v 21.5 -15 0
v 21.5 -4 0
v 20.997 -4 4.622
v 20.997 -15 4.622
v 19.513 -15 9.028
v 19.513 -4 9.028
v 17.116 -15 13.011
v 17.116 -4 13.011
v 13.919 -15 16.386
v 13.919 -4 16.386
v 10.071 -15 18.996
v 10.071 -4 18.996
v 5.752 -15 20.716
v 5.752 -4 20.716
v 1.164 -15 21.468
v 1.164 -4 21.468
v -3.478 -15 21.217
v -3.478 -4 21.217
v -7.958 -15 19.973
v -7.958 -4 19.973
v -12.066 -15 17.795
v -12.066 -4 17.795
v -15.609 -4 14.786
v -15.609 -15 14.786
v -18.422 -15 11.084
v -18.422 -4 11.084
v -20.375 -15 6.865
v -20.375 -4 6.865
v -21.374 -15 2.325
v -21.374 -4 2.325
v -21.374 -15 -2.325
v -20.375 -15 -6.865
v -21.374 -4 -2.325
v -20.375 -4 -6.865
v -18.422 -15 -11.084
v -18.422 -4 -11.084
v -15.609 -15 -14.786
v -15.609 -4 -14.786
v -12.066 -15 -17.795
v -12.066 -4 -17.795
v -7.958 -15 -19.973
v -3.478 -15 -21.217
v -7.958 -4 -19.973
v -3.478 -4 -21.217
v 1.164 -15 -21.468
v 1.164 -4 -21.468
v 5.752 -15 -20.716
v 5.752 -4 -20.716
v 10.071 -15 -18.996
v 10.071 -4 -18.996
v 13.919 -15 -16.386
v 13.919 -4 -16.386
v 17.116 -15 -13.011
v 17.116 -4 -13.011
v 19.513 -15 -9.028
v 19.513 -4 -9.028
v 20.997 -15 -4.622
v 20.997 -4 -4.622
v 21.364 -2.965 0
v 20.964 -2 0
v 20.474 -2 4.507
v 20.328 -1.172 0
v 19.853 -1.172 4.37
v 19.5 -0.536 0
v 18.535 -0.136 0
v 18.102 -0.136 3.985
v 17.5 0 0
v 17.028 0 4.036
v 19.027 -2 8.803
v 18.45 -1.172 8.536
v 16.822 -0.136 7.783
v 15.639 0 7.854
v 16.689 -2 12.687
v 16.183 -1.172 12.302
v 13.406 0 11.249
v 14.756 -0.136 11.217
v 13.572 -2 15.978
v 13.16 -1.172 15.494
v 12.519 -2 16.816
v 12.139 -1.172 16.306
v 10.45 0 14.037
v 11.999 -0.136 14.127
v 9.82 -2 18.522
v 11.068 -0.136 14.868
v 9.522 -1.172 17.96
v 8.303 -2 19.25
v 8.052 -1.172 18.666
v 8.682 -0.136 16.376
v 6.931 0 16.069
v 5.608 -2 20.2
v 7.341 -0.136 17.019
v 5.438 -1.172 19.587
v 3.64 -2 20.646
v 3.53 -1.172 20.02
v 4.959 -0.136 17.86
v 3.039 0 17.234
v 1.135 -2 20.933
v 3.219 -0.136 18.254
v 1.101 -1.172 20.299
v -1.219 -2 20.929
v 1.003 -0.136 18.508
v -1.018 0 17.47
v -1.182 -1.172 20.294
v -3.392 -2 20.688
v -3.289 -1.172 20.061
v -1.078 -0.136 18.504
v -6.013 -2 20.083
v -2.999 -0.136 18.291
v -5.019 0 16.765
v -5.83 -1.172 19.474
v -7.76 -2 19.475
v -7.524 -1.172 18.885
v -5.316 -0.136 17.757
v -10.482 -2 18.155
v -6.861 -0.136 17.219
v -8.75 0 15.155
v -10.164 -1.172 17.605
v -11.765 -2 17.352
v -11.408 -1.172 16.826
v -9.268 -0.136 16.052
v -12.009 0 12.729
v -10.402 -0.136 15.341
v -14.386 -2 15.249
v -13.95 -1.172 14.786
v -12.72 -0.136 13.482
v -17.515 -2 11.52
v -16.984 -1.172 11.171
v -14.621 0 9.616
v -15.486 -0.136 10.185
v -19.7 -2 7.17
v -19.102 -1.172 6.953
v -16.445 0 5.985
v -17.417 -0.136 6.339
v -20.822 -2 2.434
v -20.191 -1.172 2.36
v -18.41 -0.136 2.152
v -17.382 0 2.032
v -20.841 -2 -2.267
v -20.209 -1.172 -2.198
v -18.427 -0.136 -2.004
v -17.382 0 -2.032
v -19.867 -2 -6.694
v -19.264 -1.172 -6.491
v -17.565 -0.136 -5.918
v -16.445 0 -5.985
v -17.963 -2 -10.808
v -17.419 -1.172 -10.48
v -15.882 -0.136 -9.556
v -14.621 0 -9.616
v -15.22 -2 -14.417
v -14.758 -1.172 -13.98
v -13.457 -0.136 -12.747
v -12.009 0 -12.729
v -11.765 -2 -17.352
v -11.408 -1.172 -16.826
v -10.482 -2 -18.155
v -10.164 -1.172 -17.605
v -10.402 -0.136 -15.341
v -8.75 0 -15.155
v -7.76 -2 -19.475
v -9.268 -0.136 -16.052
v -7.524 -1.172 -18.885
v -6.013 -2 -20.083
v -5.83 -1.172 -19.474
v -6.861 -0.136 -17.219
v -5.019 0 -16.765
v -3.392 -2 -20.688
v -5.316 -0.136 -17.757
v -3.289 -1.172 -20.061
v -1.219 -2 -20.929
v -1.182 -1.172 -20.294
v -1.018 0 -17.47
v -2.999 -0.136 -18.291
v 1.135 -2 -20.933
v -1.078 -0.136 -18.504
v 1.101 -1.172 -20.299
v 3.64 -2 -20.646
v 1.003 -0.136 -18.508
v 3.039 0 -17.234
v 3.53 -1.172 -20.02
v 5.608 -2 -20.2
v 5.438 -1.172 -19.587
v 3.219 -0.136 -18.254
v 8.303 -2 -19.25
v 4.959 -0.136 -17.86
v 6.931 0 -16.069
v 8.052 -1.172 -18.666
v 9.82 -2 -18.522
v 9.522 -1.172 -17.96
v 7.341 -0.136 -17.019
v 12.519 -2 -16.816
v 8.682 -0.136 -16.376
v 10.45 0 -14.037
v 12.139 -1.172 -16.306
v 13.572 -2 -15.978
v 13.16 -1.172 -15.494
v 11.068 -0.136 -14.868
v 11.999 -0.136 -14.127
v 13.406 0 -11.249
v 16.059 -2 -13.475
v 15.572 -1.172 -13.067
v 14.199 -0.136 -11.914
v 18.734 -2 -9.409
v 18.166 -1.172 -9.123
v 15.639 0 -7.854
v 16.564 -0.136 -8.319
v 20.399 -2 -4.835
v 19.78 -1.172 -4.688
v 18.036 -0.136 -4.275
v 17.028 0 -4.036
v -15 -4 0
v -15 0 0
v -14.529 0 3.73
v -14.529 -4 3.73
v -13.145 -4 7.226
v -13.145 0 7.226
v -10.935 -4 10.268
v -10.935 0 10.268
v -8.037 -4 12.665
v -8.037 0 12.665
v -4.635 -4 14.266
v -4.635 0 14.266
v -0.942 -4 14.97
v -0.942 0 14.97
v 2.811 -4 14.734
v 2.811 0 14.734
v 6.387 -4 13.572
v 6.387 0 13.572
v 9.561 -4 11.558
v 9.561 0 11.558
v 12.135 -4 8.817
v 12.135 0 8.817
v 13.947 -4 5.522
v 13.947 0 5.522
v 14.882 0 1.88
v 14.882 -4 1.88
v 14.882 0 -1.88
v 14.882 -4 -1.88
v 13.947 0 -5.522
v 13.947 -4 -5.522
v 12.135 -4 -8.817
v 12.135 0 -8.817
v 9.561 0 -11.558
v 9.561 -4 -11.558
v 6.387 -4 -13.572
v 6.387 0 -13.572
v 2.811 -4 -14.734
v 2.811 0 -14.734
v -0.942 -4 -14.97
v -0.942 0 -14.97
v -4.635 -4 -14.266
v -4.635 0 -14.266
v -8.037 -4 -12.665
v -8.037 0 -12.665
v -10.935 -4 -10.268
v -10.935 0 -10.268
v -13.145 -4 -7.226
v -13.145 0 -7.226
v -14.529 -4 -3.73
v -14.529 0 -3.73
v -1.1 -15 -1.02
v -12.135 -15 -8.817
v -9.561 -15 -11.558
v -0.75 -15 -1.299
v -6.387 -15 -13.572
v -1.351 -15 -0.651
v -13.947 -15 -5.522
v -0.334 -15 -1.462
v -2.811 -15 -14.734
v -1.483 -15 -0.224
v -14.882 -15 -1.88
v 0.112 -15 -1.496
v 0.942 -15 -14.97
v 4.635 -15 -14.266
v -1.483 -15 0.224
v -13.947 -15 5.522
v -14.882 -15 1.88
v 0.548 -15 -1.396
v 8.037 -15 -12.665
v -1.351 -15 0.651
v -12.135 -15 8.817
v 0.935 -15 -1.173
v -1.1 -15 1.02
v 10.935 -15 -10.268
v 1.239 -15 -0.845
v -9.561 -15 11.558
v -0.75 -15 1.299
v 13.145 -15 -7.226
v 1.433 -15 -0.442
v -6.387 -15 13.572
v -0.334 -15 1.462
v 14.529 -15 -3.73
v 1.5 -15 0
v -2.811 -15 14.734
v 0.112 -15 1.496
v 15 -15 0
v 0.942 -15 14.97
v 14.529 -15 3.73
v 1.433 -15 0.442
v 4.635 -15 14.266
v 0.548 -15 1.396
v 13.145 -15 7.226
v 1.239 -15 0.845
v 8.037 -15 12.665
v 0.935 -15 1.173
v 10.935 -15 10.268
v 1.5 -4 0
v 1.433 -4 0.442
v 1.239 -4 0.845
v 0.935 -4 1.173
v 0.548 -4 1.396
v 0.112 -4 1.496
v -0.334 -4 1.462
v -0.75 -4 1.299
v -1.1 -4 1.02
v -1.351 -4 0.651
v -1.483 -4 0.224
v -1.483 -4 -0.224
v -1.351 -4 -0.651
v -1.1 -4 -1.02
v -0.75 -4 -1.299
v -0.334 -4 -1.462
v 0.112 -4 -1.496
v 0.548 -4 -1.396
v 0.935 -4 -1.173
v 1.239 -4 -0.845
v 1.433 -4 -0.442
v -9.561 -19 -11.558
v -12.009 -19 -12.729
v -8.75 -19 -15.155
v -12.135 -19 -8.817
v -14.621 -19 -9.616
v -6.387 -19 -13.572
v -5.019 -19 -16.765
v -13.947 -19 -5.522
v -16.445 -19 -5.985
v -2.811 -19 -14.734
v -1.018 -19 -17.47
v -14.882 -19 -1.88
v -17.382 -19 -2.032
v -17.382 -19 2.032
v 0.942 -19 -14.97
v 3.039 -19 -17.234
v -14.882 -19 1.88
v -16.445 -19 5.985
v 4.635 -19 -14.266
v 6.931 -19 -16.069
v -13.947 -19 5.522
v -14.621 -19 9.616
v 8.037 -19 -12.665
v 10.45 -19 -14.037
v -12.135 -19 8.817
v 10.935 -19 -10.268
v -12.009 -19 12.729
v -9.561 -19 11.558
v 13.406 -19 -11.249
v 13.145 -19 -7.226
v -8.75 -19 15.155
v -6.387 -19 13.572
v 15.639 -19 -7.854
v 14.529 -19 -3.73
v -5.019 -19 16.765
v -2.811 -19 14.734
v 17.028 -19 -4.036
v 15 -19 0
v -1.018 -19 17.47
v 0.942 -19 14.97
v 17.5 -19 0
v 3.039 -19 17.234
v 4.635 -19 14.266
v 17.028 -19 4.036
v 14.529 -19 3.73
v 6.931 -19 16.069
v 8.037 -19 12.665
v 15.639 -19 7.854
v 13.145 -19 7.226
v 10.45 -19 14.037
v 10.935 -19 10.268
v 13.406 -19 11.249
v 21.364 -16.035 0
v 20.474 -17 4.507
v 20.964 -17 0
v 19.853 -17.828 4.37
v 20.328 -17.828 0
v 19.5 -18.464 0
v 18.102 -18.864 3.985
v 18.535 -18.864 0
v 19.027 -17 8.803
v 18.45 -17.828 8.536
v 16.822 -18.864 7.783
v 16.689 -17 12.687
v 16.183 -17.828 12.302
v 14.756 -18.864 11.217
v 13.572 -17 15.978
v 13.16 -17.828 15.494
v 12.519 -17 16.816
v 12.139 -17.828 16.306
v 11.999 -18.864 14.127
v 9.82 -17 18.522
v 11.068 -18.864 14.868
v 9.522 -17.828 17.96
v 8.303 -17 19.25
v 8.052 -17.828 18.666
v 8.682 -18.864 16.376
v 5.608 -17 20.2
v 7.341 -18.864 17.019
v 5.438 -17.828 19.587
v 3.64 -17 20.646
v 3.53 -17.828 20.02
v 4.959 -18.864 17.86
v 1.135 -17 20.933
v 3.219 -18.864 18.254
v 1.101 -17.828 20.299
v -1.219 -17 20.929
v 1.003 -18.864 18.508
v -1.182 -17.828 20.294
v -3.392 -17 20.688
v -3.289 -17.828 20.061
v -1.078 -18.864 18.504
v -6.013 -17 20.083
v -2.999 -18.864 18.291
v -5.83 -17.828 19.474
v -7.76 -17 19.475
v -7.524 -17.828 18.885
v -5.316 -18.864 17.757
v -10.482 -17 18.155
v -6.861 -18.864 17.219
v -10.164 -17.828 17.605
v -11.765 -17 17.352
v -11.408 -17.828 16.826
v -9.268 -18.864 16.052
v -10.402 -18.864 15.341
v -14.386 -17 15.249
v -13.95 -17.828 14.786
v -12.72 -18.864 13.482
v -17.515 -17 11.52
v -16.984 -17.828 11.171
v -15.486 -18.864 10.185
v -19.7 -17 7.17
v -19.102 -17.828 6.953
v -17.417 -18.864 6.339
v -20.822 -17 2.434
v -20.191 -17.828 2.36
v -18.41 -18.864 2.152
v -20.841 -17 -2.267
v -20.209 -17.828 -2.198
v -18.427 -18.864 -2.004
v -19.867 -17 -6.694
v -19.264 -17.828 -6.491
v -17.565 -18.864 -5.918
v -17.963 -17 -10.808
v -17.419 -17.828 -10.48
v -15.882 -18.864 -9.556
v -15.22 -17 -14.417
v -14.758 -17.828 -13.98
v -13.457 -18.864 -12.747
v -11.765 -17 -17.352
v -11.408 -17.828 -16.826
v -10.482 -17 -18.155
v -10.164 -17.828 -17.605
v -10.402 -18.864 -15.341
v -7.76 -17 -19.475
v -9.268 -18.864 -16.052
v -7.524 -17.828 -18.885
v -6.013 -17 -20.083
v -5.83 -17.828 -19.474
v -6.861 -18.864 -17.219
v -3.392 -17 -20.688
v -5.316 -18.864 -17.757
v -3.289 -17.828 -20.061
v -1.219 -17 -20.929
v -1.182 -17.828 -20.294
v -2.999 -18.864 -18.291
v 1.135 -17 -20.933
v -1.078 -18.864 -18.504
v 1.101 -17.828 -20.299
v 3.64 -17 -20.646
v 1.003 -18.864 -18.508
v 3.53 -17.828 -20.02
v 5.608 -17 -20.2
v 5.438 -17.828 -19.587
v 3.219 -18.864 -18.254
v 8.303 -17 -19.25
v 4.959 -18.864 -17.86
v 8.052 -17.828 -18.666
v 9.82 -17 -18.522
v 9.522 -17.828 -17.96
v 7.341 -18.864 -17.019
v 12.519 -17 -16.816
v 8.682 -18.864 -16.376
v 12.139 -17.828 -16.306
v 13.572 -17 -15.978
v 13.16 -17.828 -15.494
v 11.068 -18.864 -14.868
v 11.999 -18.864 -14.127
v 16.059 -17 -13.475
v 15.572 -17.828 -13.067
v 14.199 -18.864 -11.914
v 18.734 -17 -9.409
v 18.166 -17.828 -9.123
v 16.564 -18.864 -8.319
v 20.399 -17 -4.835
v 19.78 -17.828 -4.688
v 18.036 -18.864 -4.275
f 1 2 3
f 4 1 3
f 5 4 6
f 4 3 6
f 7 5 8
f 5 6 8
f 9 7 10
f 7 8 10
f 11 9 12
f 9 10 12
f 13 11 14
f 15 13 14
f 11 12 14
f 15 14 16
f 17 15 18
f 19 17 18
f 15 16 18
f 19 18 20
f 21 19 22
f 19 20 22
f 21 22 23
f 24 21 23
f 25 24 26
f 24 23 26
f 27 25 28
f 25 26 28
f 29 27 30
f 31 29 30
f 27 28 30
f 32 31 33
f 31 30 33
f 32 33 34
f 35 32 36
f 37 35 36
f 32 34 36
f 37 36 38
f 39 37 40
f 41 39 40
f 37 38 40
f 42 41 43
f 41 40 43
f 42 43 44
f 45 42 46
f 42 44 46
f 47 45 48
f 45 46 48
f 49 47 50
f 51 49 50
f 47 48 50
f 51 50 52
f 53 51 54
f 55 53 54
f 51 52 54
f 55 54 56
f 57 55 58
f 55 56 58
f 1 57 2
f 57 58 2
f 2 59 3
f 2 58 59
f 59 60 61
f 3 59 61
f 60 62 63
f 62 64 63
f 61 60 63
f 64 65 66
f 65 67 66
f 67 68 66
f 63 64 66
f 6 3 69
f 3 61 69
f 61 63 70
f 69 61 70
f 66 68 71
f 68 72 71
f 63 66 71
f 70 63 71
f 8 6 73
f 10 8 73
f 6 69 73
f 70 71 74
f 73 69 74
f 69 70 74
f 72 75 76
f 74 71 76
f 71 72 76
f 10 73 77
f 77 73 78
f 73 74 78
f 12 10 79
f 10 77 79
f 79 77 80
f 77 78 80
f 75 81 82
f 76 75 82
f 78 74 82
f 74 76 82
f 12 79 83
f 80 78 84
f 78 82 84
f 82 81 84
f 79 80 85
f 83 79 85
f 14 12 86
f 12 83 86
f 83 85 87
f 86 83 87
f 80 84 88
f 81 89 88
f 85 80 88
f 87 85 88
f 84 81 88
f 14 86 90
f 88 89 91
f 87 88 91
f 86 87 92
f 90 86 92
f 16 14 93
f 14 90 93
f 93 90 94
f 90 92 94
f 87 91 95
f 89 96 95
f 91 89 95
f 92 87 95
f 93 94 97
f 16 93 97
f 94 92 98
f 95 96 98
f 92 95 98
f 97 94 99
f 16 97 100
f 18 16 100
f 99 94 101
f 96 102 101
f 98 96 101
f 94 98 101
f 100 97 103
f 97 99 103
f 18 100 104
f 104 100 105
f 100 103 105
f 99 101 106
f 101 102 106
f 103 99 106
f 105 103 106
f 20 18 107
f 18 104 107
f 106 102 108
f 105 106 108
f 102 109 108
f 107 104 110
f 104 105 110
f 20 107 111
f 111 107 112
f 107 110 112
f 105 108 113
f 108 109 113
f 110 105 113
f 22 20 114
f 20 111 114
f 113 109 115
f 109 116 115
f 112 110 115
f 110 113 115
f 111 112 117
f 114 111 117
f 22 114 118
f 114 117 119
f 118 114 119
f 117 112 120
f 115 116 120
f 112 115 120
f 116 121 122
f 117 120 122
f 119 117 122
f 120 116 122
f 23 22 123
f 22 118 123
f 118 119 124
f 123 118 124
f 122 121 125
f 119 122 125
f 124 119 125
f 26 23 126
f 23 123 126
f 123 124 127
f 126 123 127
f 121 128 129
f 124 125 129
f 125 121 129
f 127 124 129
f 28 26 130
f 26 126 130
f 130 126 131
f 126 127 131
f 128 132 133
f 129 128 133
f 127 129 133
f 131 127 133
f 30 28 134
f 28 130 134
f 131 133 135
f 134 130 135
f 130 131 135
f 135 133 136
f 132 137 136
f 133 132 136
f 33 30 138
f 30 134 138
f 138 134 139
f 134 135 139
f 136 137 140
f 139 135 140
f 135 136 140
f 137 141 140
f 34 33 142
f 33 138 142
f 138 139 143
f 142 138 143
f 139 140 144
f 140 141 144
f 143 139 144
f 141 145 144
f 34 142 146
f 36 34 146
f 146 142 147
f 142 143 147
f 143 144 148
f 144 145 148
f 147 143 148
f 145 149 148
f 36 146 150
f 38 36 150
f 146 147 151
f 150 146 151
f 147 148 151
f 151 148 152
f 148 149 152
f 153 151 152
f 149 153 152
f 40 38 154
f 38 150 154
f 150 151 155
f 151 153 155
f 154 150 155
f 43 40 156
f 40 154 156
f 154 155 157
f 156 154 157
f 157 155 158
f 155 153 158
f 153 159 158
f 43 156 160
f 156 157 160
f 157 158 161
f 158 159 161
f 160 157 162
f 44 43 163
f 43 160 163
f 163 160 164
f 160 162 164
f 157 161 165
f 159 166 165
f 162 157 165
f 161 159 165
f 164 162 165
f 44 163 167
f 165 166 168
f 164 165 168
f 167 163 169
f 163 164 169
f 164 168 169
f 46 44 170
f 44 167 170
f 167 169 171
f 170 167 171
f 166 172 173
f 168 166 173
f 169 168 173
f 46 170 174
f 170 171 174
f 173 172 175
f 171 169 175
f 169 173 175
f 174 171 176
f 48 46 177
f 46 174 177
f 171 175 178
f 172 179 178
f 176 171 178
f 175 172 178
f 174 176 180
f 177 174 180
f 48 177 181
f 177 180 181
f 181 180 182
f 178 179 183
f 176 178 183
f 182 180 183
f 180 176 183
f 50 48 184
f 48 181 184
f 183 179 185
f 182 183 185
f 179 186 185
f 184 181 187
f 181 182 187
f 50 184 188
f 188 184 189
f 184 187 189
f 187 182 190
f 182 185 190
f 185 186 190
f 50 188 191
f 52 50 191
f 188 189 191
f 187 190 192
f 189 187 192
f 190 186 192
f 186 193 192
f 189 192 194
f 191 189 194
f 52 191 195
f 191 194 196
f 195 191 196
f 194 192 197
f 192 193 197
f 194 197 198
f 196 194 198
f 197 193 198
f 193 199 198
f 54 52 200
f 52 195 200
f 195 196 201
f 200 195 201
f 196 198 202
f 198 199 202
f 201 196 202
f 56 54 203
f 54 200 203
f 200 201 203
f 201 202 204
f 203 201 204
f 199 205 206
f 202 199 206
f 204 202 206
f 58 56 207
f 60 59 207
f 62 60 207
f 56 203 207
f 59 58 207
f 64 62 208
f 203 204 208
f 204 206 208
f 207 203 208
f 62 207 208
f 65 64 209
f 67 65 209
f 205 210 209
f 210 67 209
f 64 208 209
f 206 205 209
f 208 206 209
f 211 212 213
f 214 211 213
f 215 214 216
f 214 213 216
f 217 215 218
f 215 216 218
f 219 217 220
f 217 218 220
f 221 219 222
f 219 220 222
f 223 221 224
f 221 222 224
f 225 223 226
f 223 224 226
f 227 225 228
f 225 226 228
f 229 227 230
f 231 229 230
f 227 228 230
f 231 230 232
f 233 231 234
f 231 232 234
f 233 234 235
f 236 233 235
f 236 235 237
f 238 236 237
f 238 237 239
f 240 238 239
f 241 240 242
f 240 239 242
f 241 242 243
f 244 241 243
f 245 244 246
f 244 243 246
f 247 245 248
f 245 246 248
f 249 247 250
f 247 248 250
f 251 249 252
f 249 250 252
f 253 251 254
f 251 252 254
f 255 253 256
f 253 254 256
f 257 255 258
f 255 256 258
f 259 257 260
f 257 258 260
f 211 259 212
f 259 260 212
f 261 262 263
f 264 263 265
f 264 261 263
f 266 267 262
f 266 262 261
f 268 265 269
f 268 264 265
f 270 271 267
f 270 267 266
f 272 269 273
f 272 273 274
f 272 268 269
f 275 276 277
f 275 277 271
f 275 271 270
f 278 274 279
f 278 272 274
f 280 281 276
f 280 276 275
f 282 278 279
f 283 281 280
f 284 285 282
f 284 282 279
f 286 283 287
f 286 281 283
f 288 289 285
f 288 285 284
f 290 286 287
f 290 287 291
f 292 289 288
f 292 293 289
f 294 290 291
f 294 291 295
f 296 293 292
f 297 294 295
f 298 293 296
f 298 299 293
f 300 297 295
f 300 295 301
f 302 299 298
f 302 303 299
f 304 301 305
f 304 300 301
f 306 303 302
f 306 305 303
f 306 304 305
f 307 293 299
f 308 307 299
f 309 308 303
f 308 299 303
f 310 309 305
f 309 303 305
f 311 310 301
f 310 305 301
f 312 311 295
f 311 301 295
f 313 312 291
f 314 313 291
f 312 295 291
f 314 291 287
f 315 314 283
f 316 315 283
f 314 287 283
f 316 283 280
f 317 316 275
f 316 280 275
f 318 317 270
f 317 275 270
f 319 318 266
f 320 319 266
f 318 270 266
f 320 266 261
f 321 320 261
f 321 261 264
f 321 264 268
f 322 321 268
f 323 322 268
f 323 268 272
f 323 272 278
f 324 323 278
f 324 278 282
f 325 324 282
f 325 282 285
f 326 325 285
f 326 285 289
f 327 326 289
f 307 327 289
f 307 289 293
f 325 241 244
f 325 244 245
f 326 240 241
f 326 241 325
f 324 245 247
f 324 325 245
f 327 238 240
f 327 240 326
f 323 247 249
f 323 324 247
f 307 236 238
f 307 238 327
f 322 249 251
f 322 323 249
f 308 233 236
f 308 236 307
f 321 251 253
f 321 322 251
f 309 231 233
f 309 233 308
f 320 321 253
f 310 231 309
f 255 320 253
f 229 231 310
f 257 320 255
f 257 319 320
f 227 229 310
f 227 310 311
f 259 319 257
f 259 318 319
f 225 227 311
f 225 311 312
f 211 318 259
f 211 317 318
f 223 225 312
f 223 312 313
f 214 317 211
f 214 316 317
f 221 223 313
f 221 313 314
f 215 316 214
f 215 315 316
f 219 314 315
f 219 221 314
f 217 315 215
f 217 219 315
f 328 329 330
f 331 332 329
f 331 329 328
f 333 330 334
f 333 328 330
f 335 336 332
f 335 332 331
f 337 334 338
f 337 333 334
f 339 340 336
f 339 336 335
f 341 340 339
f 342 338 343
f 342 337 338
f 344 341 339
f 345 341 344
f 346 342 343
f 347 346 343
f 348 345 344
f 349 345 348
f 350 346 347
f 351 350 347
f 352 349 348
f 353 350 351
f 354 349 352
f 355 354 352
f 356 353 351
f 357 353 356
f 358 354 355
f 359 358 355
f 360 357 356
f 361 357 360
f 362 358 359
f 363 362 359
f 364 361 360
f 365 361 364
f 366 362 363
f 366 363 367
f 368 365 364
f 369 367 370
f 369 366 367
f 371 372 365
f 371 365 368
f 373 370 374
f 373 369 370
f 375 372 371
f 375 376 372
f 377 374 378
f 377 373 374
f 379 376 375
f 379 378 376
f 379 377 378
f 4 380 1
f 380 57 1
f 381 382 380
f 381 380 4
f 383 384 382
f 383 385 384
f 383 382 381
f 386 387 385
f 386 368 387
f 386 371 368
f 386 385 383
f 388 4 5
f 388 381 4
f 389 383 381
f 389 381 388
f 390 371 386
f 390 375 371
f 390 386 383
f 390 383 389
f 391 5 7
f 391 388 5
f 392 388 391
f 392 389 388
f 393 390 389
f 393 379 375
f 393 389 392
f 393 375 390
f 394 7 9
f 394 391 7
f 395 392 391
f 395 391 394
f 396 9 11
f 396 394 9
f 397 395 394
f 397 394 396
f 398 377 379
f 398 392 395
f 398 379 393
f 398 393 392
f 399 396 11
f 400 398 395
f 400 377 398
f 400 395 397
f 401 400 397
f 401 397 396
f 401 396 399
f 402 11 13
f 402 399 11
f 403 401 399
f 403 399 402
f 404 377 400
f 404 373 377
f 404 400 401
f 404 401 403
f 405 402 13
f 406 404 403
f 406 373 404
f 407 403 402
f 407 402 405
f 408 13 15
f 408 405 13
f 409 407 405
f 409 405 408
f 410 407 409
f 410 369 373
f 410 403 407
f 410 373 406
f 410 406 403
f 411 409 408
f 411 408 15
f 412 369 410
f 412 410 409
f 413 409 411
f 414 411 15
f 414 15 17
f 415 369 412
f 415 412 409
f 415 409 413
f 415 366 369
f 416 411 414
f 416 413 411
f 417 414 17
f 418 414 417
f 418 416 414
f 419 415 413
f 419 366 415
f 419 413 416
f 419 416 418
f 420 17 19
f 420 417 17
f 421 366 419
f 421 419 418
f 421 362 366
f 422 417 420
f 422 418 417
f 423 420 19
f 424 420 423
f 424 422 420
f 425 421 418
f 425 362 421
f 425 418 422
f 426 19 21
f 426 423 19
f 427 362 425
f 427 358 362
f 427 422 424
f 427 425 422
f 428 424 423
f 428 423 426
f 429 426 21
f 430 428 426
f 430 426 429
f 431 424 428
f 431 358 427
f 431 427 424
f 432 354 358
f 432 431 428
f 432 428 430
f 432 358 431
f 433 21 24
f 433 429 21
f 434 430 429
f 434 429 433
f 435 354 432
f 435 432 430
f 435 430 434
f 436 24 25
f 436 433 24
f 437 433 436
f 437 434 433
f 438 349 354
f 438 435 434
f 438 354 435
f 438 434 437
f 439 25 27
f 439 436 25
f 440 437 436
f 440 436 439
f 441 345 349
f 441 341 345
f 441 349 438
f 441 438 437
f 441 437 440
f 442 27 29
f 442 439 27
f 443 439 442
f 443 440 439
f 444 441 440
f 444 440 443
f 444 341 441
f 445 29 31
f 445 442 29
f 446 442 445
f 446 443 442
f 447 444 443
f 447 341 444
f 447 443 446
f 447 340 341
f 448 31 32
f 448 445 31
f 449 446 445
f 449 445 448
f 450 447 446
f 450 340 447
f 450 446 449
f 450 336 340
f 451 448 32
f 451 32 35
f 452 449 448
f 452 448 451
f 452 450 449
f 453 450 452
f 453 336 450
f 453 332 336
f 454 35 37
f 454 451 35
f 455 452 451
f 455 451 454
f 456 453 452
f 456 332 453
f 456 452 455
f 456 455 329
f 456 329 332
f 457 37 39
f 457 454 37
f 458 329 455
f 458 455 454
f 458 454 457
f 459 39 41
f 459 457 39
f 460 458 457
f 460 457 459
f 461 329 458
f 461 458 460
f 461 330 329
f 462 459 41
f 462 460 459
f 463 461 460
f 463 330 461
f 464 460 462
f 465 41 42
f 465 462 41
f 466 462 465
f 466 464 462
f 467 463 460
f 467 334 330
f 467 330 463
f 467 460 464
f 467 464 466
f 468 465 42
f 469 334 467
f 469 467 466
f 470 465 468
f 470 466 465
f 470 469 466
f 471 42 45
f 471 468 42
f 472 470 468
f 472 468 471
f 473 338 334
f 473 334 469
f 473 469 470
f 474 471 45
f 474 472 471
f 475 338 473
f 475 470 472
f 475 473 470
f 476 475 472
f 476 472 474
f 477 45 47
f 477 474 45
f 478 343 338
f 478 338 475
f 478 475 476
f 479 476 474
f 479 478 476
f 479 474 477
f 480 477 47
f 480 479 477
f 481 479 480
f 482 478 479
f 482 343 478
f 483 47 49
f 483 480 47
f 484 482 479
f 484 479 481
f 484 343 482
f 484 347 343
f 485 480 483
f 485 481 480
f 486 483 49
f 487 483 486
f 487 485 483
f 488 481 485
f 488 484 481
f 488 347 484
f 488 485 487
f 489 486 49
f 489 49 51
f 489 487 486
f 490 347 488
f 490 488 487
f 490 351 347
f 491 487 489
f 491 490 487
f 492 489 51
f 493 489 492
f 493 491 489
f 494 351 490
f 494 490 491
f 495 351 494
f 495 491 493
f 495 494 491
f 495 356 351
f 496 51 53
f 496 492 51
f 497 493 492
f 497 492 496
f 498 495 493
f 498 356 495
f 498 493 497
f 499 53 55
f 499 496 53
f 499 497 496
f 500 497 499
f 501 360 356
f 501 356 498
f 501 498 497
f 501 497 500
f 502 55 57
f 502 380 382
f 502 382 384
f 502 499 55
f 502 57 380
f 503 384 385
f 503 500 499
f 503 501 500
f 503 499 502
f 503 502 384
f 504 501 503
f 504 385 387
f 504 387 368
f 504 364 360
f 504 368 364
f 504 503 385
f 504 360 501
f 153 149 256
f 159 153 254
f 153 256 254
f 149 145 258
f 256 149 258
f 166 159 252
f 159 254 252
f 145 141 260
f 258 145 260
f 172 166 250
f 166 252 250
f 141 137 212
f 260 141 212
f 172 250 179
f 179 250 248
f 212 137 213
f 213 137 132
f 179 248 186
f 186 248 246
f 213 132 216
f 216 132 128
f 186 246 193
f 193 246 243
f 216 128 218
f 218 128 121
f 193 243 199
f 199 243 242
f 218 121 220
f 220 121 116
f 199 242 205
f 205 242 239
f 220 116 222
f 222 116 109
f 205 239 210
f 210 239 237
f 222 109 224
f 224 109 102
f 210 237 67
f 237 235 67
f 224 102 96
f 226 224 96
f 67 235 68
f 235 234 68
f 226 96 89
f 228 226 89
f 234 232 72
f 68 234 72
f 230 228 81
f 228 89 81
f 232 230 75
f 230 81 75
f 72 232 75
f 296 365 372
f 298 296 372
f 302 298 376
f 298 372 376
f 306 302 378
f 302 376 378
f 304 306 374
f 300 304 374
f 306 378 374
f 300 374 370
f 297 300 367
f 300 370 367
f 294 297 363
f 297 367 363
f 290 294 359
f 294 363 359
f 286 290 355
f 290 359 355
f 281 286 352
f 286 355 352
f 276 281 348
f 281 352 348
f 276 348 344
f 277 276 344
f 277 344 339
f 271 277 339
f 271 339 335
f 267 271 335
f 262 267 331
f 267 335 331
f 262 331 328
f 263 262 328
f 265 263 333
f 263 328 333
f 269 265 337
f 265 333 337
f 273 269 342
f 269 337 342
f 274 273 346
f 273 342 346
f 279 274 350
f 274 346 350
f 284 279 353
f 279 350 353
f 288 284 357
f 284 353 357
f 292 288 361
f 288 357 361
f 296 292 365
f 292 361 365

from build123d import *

# Parameters (mm, degrees)
F0_R     = 21.5
F1_DEPTH = 19
F2_R     = 4
F3_R     = 15
F4_DEPTH = 4
F5_R     = 15
F6_DEPTH = 4
F7_R     = 1.5
F8_DEPTH = 15.001


with BuildPart() as f1:
    # F0 (on Front) → F1 (new body)
    with BuildSketch(Plane.XZ):
        Circle(F0_R)
    extrude(amount=F1_DEPTH)

    # F2
    f2_edges = [f1.edges().sort_by_distance(p)[0] for p in [
        (-21.5, -19, 0),
        (-21.5, 0, 0),
    ]]
    fillet(f2_edges, radius=F2_R)

    # F3 (on face) → F4 (cut)
    with BuildSketch(Plane(origin=(0, 0, 0), x_dir=(-1, 0, 0), z_dir=(0, 1, 0))):
        Circle(F3_R)
    extrude(amount=-F4_DEPTH, mode=Mode.SUBTRACT)

    # F5 (on face) → F6 (cut)
    with BuildSketch(Plane.XZ.offset(19)):
        Circle(F5_R)
    extrude(amount=-F6_DEPTH, mode=Mode.SUBTRACT)

    # F7 (on face) → F8 (cut, through all)
    with BuildSketch(Plane.XZ.offset(15)):
        Circle(F7_R)
    extrude(amount=-F8_DEPTH, mode=Mode.SUBTRACT)


solid = f1.part
